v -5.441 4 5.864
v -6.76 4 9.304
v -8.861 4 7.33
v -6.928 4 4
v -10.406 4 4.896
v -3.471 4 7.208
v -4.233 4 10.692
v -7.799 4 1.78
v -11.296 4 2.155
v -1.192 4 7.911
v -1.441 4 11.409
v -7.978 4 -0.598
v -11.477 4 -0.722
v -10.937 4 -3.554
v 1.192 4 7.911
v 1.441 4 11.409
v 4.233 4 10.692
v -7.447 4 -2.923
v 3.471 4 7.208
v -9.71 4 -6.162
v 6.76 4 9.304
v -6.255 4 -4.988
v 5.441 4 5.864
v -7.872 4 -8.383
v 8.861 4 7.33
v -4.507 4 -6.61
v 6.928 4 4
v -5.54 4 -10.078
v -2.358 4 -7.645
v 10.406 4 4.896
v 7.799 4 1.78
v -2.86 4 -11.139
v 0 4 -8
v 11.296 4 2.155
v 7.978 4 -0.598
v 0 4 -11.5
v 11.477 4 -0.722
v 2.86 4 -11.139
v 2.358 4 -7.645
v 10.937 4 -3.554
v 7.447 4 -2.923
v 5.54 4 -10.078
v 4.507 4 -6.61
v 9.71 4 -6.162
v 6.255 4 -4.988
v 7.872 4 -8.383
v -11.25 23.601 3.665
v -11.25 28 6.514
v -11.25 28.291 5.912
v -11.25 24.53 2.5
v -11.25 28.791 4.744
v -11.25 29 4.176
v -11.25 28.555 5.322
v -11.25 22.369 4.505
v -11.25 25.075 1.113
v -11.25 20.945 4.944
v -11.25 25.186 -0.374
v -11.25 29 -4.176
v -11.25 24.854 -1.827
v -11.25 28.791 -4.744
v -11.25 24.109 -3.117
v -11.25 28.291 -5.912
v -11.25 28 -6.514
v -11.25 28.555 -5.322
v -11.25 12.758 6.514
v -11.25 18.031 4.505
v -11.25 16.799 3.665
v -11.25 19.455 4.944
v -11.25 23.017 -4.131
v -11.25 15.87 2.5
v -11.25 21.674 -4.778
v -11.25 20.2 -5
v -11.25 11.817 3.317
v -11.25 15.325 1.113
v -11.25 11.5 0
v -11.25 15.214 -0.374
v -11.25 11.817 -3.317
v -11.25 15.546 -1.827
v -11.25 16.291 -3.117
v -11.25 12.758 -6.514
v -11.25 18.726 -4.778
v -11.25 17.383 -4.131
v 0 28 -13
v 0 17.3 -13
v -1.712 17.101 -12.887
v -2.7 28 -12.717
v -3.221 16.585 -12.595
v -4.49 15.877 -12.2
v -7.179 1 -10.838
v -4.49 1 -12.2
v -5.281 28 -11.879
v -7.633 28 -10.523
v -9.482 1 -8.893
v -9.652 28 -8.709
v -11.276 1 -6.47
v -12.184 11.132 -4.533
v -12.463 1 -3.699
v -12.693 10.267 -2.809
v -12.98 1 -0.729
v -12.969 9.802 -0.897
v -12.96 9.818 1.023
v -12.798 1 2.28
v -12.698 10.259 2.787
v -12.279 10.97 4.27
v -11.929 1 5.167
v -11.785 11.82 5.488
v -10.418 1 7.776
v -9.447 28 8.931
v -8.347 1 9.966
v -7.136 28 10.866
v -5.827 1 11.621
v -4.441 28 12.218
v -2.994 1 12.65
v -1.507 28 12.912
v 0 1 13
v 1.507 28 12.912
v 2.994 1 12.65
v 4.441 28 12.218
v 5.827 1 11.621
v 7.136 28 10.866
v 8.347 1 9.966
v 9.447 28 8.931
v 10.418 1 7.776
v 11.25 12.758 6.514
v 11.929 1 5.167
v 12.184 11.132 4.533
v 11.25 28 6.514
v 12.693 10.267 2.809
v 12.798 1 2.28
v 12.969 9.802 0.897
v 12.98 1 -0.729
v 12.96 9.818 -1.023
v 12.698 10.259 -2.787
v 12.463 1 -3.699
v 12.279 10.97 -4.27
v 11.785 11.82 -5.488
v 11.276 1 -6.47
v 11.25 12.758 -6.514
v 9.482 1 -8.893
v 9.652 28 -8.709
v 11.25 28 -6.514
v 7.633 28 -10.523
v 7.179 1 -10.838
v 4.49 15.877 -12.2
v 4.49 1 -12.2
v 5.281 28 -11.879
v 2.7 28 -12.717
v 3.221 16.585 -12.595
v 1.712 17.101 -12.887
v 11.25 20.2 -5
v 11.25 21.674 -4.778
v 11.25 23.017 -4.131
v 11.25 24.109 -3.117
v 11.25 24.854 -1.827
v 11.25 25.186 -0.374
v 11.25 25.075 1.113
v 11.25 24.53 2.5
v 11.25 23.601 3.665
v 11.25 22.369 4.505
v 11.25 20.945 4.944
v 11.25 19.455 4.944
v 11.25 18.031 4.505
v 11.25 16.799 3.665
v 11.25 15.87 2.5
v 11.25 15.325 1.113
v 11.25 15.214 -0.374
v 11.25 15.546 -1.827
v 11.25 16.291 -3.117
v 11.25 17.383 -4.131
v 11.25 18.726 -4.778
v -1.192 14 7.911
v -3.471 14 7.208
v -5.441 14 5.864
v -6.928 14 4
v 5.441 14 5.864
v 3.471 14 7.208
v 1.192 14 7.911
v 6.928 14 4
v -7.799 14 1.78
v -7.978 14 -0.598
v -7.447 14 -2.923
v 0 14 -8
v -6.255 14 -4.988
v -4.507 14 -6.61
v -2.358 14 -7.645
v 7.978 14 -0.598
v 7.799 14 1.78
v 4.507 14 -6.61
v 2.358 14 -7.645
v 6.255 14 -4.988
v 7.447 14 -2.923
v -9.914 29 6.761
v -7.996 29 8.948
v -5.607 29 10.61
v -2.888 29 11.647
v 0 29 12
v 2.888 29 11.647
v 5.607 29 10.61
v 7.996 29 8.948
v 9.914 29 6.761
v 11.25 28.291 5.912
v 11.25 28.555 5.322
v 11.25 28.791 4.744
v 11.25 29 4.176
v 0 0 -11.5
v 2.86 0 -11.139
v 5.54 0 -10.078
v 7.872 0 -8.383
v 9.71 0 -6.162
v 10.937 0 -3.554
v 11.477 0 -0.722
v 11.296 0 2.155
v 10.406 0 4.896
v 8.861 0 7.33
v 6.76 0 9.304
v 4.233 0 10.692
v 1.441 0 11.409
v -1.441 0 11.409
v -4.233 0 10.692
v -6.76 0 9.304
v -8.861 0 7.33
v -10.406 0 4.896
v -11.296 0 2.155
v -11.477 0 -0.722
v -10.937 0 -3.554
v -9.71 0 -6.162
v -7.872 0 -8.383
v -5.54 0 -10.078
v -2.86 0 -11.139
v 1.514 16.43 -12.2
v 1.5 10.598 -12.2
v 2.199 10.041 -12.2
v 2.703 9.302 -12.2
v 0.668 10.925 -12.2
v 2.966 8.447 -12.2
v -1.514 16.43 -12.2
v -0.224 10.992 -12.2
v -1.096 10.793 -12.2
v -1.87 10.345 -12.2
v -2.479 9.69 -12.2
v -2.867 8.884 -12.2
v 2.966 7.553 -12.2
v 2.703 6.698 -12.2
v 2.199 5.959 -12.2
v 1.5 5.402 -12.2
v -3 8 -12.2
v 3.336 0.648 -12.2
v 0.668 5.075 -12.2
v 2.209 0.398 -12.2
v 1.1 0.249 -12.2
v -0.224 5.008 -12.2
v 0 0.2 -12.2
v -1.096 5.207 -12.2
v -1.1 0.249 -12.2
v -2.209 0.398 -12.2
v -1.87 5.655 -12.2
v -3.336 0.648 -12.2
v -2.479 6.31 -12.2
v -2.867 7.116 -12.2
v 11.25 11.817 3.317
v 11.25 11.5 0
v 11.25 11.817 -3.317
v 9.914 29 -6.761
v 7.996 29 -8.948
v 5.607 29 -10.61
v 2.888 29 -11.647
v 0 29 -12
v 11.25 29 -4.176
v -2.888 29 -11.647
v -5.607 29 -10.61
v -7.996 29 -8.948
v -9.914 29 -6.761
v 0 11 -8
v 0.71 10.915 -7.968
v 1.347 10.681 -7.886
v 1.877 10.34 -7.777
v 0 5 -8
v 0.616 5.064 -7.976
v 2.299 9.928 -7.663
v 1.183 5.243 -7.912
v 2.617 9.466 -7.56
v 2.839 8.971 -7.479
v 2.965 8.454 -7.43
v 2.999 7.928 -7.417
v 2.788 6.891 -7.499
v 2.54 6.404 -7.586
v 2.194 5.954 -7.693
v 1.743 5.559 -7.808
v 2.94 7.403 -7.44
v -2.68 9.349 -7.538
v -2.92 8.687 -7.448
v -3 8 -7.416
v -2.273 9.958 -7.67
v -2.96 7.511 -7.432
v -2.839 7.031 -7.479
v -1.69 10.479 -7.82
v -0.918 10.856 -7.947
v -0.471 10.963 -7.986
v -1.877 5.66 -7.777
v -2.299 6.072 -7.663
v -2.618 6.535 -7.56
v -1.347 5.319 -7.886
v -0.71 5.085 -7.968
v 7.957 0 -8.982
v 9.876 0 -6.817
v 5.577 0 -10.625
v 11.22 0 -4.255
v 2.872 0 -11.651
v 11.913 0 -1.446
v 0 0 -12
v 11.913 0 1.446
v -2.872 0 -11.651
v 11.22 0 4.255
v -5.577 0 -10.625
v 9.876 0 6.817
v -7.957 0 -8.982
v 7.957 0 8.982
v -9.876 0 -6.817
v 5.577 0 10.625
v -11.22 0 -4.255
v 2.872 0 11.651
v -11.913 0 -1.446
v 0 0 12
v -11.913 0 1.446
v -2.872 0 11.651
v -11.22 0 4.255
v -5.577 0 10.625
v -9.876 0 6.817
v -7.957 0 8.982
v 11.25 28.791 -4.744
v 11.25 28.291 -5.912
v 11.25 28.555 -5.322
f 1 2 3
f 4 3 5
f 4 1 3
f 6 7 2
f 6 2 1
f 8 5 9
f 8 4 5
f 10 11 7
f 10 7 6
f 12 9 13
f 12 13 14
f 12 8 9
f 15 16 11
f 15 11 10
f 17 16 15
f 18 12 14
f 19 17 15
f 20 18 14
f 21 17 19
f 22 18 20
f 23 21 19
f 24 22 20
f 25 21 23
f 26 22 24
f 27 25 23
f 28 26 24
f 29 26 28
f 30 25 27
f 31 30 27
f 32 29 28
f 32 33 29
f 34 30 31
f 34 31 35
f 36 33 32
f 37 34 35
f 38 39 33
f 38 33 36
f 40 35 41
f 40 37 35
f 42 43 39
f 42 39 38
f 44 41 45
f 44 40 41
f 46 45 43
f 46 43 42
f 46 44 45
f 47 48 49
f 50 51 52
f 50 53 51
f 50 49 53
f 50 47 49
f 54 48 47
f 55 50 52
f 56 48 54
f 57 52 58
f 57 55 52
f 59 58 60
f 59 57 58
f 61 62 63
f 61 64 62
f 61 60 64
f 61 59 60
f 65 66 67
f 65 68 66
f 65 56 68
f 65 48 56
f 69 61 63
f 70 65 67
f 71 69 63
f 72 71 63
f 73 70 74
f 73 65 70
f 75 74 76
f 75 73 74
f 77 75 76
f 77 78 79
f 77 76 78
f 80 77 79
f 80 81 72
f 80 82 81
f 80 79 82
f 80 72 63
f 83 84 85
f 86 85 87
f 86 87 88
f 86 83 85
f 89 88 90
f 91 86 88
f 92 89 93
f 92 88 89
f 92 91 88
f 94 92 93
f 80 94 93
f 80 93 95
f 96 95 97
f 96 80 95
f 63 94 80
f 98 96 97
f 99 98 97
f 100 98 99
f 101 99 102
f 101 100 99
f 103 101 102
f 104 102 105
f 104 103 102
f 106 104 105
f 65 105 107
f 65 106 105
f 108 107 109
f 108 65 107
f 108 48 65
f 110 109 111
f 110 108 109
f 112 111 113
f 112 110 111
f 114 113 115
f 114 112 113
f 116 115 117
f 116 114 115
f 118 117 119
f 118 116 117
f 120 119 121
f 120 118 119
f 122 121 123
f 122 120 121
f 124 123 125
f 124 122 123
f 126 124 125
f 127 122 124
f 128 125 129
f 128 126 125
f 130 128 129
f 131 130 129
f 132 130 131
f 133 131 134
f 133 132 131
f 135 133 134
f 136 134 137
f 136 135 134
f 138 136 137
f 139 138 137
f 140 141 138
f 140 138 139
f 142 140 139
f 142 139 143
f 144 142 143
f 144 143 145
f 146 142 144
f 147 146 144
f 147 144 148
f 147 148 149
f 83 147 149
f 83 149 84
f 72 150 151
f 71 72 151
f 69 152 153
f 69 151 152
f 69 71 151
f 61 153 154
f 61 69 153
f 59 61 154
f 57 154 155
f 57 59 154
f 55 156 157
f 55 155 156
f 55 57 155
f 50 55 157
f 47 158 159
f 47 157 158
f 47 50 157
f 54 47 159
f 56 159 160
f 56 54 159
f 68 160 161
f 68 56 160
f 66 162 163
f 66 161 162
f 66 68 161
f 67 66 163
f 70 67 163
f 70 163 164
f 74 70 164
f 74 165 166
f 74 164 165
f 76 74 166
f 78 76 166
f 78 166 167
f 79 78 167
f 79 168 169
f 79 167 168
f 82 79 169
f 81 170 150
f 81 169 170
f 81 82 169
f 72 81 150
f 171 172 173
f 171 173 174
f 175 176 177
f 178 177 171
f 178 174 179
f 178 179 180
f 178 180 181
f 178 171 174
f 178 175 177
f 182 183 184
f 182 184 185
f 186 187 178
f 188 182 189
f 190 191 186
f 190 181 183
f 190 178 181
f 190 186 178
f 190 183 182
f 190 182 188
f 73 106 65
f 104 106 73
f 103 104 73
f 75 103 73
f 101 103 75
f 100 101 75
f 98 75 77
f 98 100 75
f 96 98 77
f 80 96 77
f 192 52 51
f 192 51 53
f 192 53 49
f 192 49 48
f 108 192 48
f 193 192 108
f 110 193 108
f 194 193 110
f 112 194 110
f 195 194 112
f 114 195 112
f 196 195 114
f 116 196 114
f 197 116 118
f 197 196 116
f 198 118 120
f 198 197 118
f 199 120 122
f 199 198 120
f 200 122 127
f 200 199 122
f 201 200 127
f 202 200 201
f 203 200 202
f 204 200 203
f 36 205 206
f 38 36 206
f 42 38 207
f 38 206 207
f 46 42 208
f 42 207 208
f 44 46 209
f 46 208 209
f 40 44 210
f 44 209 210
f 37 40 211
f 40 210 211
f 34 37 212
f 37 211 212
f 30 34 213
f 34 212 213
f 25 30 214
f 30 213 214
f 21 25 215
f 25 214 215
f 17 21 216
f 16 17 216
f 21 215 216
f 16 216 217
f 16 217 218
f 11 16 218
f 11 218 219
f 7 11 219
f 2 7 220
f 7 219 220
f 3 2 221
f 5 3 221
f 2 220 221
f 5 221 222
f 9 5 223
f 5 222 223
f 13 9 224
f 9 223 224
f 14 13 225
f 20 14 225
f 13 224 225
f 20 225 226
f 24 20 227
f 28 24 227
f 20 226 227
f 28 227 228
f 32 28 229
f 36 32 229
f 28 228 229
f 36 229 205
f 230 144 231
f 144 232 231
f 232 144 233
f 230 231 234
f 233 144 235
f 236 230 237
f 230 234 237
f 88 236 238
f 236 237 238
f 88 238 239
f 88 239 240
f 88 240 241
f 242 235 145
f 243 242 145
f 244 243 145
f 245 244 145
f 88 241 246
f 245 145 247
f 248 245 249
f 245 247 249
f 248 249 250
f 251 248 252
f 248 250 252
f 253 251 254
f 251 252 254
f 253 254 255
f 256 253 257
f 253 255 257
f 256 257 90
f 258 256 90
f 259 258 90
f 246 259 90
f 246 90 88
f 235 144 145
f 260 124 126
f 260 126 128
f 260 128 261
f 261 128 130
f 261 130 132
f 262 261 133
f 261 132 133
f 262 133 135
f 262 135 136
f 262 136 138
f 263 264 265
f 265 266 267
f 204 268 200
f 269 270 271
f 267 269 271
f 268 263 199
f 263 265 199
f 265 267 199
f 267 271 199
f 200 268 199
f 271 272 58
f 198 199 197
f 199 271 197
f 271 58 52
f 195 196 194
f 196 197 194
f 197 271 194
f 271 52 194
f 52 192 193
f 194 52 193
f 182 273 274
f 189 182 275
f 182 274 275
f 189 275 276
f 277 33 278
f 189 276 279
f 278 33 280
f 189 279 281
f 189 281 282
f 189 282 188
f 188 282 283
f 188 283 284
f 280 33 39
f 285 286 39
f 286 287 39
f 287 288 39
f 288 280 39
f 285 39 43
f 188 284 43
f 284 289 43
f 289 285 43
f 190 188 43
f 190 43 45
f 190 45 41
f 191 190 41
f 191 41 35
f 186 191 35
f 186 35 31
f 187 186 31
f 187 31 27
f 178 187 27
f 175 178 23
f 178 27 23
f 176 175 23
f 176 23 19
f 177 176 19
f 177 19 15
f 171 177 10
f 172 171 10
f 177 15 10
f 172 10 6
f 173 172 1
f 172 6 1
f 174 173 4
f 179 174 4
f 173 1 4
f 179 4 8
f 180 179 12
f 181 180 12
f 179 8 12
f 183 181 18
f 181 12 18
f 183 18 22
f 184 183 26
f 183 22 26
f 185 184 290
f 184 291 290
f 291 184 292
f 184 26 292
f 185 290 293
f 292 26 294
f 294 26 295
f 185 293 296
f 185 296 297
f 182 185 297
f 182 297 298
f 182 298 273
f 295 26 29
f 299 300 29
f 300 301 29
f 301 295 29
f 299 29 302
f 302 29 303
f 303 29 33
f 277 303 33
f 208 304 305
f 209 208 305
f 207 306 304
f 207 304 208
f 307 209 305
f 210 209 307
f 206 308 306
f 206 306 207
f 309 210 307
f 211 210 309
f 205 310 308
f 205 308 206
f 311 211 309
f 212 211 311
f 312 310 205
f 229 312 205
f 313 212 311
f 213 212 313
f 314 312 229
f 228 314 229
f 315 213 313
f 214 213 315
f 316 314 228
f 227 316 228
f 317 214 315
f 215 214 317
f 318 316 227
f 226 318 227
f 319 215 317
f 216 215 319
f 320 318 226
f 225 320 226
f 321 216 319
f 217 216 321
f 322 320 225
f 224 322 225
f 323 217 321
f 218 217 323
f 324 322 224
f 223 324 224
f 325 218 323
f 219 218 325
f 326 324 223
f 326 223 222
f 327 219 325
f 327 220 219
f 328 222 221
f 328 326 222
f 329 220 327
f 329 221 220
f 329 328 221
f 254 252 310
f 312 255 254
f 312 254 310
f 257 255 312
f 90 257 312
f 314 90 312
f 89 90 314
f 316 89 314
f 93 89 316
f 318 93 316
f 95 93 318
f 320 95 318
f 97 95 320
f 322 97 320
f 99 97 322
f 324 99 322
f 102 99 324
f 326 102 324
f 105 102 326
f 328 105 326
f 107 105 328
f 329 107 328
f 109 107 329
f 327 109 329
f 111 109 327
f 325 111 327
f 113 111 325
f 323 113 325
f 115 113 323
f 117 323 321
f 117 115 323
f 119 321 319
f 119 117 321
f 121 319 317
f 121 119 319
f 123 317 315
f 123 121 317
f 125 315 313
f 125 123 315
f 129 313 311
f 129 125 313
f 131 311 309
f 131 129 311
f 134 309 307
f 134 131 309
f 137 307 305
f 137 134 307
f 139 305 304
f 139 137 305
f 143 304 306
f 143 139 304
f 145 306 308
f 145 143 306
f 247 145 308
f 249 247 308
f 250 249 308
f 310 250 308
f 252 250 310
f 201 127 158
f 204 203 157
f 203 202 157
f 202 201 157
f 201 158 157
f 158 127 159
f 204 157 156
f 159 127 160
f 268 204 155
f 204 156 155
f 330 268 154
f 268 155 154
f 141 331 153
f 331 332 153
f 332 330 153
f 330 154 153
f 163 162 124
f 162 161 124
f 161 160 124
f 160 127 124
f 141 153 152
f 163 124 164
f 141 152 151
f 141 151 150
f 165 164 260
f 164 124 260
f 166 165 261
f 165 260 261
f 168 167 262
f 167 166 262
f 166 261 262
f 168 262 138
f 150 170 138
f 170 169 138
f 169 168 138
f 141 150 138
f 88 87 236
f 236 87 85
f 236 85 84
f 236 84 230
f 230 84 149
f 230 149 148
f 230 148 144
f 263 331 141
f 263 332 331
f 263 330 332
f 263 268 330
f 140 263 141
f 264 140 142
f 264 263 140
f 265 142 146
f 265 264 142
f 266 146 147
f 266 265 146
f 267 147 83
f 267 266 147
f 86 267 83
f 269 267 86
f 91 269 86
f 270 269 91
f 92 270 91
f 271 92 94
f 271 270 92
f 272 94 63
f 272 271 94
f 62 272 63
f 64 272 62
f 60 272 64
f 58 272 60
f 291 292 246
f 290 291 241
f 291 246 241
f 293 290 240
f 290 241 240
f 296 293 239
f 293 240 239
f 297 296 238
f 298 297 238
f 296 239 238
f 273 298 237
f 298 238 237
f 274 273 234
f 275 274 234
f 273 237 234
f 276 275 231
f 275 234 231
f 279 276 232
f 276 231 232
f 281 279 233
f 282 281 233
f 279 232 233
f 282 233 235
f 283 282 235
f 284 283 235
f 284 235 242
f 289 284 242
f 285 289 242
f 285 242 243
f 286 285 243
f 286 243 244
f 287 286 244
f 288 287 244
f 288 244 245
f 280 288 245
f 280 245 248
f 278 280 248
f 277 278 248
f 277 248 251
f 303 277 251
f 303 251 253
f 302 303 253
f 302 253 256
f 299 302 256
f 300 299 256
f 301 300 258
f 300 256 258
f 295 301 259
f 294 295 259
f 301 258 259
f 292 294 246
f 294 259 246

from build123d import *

# Parameters (mm, degrees)
ESQUISSE1_W                  = 13
ESQUISSE1_H                  = 29
ESQUISSE2_R                  = 11.5
ENL_V_MAT_EXTRU_1_DEPTH      = 4
CHANFREIN1_SIZE              = 1
ESQUISSE4_R                  = 8
ENL_V_MAT_EXTRU_2_DEPTH      = 10
ENL_V_MAT_EXTRU_4_DEPTH      = 35.336569502
ENL_V_MAT_EXTRU_4_DEPTH_BACK = 35.336569502
ESQUISSE6_R                  = 5
ENL_V_MAT_EXTRU_5_REACH      = 42.559
ESQUISSE8_R                  = 3


with BuildPart() as part:
    # Esquisse1 → Base-Révolution (revolve)
    with BuildSketch(Plane.XY, mode=Mode.PRIVATE) as base_r_volution_sk:
        with Locations((6.5, 14.5)):
            Rectangle(ESQUISSE1_W, ESQUISSE1_H)
    revolve(base_r_volution_sk.sketch.rotate(Axis((0, 0, 0), (0, 1, 0)), 90), axis=Axis((0, 0, 0), (0, 1, 0)))

    # Esquisse2 → Enlèv. mat.-Extru.1 (cut)
    with BuildSketch(Plane.XZ):
        with Locations(Location((0, 0, 0), (0, 0, 270))):
            Circle(ESQUISSE2_R)
    extrude(amount=-ENL_V_MAT_EXTRU_1_DEPTH, mode=Mode.SUBTRACT)

    # Chanfrein1
    chanfrein1_edges = [part.edges().sort_by_distance(p)[0] for p in [
        (0, 0, 13),
        (0, 29, 13),
    ]]
    chamfer(chanfrein1_edges, length=CHANFREIN1_SIZE)

    # Esquisse3 → Enlèvement de matière-Révolution1 (revolve, cut)
    with BuildSketch(Plane(origin=(0, 0, 0), x_dir=(1, 0, 0), z_dir=(0, 1, 0))):
        Polygon((0, 12.2), (16.5, 12.2), (21.5, 17.2), (0, 17.2), align=None)
    revolve(axis=Axis((0, 0, 0), (0, 0, -1)), mode=Mode.SUBTRACT)

    # Esquisse4 → Enlèv. mat.-Extru.2 (cut)
    with BuildSketch(Plane.XZ.offset(-4)):
        with Locations(Location((0, 0, 0), (0, 0, 270))):
            Circle(ESQUISSE4_R)
    extrude(amount=-ENL_V_MAT_EXTRU_2_DEPTH, mode=Mode.SUBTRACT)

    # Esquisse6 → Enlèv. mat.-Extru.4 (cut, two sides: drawn at the far end of the back side and taken through both)
    with BuildSketch(Plane(origin=(0, 0, 0), x_dir=(0, 0, -1), z_dir=(1, 0, 0)).offset(-ENL_V_MAT_EXTRU_4_DEPTH_BACK)):
        with Locations((0, 20.2)):
            Circle(ESQUISSE6_R)
    extrude(amount=ENL_V_MAT_EXTRU_4_DEPTH + ENL_V_MAT_EXTRU_4_DEPTH_BACK, mode=Mode.SUBTRACT)

    # Esquisse7 → Enlèvement de matière-Révolution2 (revolve, cut)
    with BuildSketch(Plane(origin=(0, 29, 0), x_dir=(-1, 0, 0), z_dir=(0, 1, 0))):
        Polygon((-11.25, 0), (-11.25, 17.5), (-16.25, 22.5), (-16.25, 0), align=None)
        Polygon((11.25, 0), (11.25, 17.5), (16.25, 22.5), (16.25, 0), align=None)
    revolve(axis=Axis((0, 29, 0), (1, 0, 0)), mode=Mode.SUBTRACT)

    # Esquisse8 → Enlèv. mat.-Extru.5 (cut, up to next)
    with BuildSketch(Plane(origin=(0, 0, -12.2), x_dir=(-1, 0, 0), z_dir=(0, 0, -1)), mode=Mode.PRIVATE) as enl_v_mat_extru_5_sk1:
        with Locations((0, 8)):
            Circle(ESQUISSE8_R)
    enl_v_mat_extru_5_tool1 = extrude(enl_v_mat_extru_5_sk1.sketch, amount=-ENL_V_MAT_EXTRU_5_REACH, mode=Mode.PRIVATE) & part.part
    add(enl_v_mat_extru_5_tool1.solids().sort_by_distance((0, 8, -12.2))[0], mode=Mode.SUBTRACT)


solid = part.part
